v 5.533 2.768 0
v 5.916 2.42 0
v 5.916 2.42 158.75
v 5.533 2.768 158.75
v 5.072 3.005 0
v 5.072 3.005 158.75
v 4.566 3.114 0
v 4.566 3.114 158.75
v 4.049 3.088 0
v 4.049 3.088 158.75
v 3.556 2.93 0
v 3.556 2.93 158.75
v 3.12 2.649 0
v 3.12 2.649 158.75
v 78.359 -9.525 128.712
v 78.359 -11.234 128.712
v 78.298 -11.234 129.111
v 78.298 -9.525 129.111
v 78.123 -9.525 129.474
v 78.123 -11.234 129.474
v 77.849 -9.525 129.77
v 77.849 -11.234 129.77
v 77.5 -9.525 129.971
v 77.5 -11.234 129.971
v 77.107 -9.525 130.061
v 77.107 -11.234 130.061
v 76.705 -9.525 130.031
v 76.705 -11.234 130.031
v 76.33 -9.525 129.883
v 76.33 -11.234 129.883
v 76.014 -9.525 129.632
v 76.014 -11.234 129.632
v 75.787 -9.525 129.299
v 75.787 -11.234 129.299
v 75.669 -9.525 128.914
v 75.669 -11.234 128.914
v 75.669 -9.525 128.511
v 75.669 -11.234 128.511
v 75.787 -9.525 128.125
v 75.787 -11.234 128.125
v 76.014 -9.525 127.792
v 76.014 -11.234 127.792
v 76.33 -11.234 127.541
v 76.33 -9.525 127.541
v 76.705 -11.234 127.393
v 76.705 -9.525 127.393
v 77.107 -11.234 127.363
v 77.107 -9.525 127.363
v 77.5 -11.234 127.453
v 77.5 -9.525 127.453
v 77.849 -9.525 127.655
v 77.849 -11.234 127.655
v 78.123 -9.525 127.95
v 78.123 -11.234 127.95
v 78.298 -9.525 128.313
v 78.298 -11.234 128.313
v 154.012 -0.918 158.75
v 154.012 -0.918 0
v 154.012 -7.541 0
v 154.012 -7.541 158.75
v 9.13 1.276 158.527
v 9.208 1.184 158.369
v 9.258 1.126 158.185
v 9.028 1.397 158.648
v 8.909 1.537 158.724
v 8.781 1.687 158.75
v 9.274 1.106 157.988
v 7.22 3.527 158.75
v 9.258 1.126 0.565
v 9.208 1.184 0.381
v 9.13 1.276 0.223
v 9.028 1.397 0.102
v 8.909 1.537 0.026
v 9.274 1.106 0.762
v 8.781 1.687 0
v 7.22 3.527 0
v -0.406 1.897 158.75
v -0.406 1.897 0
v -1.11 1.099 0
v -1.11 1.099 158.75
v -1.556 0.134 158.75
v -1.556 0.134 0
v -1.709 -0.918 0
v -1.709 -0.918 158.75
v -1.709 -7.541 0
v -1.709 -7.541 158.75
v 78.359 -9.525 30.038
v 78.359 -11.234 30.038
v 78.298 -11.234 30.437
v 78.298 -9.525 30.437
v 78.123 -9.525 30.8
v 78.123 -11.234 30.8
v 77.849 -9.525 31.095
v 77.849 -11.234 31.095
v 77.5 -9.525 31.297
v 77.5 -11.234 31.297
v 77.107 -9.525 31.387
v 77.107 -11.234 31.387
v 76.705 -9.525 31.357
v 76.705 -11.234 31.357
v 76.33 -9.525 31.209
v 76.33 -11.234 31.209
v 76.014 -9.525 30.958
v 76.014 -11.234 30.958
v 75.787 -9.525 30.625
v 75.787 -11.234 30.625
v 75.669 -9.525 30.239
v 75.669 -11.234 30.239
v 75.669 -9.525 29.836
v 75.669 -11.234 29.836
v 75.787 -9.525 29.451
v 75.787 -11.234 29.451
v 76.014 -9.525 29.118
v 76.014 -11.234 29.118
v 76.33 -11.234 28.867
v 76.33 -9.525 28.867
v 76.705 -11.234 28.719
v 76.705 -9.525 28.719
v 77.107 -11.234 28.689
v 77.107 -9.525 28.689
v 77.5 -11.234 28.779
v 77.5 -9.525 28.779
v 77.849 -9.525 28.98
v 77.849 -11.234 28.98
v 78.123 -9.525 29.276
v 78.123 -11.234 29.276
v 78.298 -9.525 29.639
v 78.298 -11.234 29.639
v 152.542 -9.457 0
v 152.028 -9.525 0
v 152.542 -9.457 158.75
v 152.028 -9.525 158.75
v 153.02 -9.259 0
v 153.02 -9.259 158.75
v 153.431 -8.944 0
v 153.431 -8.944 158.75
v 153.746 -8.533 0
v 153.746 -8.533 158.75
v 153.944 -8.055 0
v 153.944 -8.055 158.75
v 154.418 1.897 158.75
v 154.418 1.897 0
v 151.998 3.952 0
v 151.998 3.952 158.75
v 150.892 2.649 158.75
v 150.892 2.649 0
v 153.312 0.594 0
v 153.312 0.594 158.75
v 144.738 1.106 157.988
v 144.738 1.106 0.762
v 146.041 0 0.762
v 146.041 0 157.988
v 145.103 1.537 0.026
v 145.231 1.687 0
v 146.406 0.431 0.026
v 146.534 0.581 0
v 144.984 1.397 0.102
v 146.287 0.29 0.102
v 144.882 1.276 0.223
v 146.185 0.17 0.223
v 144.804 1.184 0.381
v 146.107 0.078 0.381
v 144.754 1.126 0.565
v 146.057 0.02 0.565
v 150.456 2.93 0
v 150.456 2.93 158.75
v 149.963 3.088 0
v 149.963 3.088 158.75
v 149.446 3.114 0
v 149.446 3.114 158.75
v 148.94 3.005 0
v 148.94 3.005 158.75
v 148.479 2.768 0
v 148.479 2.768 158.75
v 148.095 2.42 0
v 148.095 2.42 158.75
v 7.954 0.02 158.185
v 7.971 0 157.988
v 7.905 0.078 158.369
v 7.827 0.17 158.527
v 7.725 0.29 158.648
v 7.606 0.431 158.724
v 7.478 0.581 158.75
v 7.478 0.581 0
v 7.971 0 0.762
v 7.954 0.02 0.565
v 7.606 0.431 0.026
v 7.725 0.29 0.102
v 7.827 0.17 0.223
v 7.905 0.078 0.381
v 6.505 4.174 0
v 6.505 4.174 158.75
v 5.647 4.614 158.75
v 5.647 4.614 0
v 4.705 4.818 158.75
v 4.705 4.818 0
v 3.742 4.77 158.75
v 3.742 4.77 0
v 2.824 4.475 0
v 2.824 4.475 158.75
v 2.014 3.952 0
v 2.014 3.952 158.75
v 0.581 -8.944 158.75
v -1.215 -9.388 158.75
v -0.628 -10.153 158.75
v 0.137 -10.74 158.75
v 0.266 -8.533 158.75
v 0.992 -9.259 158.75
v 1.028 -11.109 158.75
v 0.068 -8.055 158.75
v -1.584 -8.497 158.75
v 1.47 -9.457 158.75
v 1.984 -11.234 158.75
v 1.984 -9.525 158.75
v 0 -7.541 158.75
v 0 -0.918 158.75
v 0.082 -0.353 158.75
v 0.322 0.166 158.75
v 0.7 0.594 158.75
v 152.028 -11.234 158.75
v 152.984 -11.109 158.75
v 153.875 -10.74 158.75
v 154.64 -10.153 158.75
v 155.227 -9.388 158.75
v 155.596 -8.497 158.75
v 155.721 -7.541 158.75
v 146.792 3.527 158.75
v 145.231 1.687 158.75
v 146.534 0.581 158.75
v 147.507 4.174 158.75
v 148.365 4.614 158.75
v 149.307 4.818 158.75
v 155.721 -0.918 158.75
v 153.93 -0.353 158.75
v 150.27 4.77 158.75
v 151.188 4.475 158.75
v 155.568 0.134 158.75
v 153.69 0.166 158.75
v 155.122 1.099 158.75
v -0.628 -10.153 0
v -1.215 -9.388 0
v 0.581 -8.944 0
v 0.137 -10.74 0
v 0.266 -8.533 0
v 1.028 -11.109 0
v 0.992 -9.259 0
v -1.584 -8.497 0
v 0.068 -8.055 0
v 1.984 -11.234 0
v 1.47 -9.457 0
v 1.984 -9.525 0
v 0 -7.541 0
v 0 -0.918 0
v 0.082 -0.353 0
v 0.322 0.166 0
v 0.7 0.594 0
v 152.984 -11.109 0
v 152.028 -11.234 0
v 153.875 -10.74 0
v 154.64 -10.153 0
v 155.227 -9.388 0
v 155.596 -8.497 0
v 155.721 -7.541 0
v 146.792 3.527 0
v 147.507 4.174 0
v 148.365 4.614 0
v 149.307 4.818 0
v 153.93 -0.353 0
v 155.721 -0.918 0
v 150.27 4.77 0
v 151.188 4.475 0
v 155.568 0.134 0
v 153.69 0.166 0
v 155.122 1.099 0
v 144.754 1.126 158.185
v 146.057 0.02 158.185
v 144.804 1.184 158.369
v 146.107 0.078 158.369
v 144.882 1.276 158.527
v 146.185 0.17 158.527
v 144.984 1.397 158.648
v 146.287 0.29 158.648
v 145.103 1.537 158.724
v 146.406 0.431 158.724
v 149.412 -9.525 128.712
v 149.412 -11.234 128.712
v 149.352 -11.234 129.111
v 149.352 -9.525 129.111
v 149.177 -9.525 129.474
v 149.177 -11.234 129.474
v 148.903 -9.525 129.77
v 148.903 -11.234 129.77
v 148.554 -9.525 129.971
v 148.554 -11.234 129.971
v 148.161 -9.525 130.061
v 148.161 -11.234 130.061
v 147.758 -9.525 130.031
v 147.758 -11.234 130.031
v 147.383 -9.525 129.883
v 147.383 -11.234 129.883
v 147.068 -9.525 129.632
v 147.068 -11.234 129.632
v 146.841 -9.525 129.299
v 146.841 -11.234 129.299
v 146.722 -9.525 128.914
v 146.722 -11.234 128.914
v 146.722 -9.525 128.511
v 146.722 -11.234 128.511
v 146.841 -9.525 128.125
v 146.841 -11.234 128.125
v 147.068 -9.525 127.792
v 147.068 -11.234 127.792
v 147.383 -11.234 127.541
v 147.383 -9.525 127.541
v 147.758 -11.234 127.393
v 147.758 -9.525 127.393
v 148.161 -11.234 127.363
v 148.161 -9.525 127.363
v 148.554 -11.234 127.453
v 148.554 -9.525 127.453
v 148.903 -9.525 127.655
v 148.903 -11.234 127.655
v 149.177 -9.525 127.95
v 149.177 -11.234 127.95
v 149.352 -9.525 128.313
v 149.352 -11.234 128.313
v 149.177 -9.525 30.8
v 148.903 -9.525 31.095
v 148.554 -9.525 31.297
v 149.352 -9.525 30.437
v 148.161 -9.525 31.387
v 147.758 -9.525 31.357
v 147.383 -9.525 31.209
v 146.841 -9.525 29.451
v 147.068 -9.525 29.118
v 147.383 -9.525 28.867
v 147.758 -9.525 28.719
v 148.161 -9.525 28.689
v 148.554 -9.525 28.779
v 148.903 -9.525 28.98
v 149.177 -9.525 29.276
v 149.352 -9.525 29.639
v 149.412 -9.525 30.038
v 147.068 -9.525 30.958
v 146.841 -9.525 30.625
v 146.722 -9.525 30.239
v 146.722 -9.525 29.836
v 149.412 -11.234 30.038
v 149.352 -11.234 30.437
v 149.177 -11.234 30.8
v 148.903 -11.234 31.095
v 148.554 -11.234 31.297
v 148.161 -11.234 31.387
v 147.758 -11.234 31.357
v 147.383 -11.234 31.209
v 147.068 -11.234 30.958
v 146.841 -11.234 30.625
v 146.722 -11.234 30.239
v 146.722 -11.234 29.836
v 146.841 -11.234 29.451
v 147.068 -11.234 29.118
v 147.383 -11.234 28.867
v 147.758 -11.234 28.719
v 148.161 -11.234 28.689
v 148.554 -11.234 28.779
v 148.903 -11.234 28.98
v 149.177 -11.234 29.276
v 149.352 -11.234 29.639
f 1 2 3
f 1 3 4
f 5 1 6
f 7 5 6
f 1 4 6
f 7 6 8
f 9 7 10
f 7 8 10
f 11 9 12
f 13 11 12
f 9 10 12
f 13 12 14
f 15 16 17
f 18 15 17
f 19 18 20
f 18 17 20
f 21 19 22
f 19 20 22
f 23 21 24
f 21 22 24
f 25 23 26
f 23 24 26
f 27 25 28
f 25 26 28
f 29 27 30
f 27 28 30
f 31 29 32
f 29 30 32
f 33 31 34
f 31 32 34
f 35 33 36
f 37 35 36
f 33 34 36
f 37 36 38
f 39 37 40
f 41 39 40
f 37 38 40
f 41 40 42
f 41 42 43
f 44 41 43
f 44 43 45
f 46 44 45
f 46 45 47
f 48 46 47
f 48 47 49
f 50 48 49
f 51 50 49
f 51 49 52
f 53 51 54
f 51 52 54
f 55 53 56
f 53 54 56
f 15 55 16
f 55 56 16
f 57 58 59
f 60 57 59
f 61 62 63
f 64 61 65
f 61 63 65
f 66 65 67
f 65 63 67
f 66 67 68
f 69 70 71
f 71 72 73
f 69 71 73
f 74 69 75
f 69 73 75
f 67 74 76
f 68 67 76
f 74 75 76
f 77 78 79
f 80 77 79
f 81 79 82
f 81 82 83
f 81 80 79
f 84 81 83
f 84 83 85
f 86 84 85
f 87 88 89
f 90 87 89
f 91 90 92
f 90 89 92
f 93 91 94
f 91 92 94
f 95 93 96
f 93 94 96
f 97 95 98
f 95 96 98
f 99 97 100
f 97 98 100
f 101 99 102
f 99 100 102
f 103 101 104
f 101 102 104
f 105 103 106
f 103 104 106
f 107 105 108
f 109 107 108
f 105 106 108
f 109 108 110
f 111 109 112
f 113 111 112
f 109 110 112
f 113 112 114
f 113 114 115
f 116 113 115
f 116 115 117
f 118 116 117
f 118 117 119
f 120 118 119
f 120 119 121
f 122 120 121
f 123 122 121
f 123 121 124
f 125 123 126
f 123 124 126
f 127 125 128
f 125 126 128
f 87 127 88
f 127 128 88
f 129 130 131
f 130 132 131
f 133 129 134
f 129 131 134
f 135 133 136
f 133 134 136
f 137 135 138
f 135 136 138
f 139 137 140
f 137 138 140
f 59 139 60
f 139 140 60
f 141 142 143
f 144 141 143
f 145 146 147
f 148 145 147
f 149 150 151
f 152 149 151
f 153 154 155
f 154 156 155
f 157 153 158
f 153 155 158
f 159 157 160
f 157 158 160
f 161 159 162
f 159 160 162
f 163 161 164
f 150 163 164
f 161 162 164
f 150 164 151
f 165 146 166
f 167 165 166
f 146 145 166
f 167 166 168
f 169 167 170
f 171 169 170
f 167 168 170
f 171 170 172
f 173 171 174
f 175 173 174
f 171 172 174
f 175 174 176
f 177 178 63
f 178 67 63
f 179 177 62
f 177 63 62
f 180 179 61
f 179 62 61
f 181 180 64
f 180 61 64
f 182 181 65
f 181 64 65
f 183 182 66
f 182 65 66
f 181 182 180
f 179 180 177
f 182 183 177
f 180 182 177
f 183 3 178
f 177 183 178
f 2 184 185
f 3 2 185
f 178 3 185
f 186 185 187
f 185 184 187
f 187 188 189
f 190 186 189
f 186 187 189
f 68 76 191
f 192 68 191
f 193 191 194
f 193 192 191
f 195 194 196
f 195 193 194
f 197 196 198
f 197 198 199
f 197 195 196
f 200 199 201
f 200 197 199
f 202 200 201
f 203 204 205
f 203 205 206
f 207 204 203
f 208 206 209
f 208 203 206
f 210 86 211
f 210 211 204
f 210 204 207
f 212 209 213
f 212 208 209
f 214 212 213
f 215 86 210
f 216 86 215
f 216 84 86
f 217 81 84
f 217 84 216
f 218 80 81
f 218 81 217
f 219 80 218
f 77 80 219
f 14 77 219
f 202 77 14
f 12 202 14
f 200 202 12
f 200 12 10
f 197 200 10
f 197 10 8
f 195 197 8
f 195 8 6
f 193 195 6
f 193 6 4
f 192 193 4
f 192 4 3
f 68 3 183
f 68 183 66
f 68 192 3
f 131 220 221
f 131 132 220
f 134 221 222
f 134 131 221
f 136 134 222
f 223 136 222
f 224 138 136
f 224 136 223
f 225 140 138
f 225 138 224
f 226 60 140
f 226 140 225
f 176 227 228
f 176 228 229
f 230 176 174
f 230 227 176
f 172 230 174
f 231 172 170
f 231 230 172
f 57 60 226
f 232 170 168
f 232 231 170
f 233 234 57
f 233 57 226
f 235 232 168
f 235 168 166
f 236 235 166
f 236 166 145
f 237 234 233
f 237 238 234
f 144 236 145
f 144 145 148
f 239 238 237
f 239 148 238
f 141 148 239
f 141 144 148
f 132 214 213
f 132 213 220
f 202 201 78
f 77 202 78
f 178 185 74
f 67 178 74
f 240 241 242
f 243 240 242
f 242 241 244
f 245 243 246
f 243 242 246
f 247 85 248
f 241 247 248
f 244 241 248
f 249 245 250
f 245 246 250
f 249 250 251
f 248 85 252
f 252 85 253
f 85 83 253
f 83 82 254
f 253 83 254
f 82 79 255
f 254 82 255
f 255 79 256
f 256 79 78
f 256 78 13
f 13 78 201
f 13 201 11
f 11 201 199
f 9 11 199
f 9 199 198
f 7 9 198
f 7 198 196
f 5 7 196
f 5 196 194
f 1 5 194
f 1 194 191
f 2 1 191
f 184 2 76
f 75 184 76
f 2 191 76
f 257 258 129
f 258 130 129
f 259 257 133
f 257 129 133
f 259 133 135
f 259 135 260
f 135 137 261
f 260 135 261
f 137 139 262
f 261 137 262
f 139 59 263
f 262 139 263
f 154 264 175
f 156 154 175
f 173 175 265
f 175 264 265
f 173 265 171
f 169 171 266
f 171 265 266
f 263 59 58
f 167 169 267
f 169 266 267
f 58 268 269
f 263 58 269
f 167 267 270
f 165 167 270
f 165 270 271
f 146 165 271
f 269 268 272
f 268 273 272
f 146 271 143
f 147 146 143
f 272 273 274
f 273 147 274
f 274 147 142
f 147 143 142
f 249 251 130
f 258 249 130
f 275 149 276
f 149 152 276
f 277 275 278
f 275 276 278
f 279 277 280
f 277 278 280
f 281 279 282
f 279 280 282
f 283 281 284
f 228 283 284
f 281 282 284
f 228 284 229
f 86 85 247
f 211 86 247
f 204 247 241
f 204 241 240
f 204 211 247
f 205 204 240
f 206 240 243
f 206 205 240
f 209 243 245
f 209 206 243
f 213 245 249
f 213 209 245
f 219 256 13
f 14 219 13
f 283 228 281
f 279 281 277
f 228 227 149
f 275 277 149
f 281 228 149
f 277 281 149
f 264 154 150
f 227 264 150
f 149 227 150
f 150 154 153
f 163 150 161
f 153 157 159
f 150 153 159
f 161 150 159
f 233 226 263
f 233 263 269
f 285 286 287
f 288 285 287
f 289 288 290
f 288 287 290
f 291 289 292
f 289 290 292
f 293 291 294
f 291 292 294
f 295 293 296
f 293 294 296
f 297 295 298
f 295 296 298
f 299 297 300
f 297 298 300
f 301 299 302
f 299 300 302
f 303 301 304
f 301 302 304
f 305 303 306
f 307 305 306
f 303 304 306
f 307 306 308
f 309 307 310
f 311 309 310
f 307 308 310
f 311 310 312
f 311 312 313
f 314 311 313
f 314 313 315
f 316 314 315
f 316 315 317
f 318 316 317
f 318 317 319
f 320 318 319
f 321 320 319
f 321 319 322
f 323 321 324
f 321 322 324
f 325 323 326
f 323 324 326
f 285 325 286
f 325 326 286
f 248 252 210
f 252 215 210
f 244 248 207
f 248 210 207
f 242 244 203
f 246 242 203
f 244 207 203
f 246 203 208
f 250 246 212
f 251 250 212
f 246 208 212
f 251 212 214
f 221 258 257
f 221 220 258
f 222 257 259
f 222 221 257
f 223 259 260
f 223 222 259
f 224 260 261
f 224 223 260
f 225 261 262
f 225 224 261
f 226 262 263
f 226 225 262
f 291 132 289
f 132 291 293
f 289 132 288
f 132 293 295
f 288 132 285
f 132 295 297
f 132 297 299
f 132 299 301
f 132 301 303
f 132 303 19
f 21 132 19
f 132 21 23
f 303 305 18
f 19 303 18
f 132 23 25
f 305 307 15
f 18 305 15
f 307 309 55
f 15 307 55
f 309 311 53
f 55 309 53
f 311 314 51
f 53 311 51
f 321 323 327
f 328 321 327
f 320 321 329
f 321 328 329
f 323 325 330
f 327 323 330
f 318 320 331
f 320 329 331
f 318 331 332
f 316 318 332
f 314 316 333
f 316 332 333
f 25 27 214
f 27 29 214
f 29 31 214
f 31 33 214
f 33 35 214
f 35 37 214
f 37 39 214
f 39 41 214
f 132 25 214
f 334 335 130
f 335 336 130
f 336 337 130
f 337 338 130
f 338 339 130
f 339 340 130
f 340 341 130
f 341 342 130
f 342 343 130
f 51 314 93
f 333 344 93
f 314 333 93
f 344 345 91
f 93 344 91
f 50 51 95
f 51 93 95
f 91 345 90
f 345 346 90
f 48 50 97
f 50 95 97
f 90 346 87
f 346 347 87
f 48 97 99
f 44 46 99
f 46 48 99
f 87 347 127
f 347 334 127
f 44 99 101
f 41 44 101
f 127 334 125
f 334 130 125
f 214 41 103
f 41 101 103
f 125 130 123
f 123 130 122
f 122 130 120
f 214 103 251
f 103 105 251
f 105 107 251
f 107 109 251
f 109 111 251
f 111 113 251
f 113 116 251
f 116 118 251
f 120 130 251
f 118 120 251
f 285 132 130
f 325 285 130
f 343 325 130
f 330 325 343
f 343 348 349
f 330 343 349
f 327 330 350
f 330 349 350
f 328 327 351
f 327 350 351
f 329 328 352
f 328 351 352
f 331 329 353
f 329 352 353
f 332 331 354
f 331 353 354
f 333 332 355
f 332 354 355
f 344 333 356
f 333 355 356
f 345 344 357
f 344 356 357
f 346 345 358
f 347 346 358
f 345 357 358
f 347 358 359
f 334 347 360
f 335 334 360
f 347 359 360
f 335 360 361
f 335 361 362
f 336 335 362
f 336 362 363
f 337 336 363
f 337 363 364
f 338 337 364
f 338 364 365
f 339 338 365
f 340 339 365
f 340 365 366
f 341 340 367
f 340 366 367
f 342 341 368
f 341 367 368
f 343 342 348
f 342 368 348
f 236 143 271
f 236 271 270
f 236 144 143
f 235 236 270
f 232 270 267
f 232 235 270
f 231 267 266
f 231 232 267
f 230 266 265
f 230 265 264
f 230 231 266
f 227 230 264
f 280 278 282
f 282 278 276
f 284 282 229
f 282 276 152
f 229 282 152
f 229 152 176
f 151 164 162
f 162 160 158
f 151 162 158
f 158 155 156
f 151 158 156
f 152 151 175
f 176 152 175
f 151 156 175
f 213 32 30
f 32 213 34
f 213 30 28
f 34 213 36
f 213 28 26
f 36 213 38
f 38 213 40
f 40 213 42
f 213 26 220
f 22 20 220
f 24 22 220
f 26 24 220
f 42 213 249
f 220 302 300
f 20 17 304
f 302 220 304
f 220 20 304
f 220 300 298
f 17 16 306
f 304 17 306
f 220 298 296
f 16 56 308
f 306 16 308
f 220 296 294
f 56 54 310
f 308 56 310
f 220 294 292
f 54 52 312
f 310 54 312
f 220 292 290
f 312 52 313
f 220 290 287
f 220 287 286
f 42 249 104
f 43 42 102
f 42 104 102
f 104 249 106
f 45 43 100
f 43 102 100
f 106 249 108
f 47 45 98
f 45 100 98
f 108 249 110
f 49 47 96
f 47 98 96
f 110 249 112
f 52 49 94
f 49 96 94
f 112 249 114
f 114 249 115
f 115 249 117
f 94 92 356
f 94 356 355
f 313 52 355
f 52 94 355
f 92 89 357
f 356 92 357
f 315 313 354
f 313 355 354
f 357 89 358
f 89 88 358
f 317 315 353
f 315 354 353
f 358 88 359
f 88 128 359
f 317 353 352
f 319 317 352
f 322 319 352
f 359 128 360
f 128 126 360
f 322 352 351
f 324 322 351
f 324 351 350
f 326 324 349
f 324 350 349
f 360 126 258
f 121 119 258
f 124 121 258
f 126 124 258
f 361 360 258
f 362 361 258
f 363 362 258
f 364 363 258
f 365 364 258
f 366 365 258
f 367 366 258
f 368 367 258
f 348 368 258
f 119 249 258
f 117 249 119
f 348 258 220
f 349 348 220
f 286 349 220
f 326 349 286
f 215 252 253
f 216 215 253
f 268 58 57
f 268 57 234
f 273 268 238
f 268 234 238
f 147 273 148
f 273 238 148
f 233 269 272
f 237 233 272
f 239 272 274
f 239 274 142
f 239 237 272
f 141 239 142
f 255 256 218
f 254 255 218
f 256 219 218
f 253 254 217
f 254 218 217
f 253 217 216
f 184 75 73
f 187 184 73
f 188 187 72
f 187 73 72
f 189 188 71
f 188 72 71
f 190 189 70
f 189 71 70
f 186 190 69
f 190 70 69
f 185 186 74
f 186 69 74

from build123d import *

# Parameters (mm, degrees)
F1_DEPTH = 158.75
F2_R     = 3.69316
F3_R     = 1.98374
F4_R     = 1.35255
F5_DEPTH = 1.70942
F6_R     = 0.762


with BuildPart() as f1:
    # F0 (on Top) → F1 (new body)
    with BuildSketch(Plane.XY):
        Polygon((0, -9.525), (0, 0), (4.632677, 3.932751), (7.97125, 0), (9.274422, 1.106282), (4.829567, 6.342205), (-1.70942, 0.791159), (-1.70942, -11.23442), (155.721346, -11.23442), (155.721346, 0.791159), (149.18236, 6.342205), (144.737505, 1.106282), (146.040676, 0), (149.379249, 3.932751), (154.011926, 0), (154.011926, -9.525), align=None)
    extrude(amount=F1_DEPTH)

    # F2
    f2_edges = [f1.edges().sort_by_distance(p)[0] for p in [
        (149.18236, 6.342205, 79.375),
        (155.721346, 0.791159, 79.375),
        (155.721346, -11.23442, 79.375),
        (-1.70942, -11.23442, 79.375),
        (-1.70942, 0.791159, 79.375),
        (4.829567, 6.342205, 79.375),
    ]]
    fillet(f2_edges, radius=F2_R)

    # F3
    f3_edges = [f1.edges().sort_by_distance(p)[0] for p in [
        (149.379249, 3.932751, 79.375),
        (154.011926, 0, 79.375),
        (154.011926, -9.525, 79.375),
        (0, -9.525, 79.375),
        (0, 0, 79.375),
        (4.632677, 3.932751, 79.375),
    ]]
    fillet(f3_edges, radius=F3_R)

    # F4 (on face) → F5 (cut, through all)
    with BuildSketch(Plane.XZ.offset(11.23442)):
        with Locations((148.059436, 128.712112)):
            Circle(F4_R)
        with Locations((77.005963, 128.712112)):
            Circle(F4_R)
        with Locations((77.005963, 30.037888)):
            Circle(F4_R)
        with Locations((148.059436, 30.037888)):
            Circle(F4_R)
    extrude(amount=-F5_DEPTH, mode=Mode.SUBTRACT)

    # F6
    f6_edges = [f1.edges().sort_by_distance(p)[0] for p in [
        (145.38909, 0.553141, 158.75),
        (145.38909, 0.553141, 0),
        (8.622836, 0.553141, 0),
        (8.622836, 0.553141, 158.75),
    ]]
    fillet(f6_edges, radius=F6_R)


solid = f1.part
